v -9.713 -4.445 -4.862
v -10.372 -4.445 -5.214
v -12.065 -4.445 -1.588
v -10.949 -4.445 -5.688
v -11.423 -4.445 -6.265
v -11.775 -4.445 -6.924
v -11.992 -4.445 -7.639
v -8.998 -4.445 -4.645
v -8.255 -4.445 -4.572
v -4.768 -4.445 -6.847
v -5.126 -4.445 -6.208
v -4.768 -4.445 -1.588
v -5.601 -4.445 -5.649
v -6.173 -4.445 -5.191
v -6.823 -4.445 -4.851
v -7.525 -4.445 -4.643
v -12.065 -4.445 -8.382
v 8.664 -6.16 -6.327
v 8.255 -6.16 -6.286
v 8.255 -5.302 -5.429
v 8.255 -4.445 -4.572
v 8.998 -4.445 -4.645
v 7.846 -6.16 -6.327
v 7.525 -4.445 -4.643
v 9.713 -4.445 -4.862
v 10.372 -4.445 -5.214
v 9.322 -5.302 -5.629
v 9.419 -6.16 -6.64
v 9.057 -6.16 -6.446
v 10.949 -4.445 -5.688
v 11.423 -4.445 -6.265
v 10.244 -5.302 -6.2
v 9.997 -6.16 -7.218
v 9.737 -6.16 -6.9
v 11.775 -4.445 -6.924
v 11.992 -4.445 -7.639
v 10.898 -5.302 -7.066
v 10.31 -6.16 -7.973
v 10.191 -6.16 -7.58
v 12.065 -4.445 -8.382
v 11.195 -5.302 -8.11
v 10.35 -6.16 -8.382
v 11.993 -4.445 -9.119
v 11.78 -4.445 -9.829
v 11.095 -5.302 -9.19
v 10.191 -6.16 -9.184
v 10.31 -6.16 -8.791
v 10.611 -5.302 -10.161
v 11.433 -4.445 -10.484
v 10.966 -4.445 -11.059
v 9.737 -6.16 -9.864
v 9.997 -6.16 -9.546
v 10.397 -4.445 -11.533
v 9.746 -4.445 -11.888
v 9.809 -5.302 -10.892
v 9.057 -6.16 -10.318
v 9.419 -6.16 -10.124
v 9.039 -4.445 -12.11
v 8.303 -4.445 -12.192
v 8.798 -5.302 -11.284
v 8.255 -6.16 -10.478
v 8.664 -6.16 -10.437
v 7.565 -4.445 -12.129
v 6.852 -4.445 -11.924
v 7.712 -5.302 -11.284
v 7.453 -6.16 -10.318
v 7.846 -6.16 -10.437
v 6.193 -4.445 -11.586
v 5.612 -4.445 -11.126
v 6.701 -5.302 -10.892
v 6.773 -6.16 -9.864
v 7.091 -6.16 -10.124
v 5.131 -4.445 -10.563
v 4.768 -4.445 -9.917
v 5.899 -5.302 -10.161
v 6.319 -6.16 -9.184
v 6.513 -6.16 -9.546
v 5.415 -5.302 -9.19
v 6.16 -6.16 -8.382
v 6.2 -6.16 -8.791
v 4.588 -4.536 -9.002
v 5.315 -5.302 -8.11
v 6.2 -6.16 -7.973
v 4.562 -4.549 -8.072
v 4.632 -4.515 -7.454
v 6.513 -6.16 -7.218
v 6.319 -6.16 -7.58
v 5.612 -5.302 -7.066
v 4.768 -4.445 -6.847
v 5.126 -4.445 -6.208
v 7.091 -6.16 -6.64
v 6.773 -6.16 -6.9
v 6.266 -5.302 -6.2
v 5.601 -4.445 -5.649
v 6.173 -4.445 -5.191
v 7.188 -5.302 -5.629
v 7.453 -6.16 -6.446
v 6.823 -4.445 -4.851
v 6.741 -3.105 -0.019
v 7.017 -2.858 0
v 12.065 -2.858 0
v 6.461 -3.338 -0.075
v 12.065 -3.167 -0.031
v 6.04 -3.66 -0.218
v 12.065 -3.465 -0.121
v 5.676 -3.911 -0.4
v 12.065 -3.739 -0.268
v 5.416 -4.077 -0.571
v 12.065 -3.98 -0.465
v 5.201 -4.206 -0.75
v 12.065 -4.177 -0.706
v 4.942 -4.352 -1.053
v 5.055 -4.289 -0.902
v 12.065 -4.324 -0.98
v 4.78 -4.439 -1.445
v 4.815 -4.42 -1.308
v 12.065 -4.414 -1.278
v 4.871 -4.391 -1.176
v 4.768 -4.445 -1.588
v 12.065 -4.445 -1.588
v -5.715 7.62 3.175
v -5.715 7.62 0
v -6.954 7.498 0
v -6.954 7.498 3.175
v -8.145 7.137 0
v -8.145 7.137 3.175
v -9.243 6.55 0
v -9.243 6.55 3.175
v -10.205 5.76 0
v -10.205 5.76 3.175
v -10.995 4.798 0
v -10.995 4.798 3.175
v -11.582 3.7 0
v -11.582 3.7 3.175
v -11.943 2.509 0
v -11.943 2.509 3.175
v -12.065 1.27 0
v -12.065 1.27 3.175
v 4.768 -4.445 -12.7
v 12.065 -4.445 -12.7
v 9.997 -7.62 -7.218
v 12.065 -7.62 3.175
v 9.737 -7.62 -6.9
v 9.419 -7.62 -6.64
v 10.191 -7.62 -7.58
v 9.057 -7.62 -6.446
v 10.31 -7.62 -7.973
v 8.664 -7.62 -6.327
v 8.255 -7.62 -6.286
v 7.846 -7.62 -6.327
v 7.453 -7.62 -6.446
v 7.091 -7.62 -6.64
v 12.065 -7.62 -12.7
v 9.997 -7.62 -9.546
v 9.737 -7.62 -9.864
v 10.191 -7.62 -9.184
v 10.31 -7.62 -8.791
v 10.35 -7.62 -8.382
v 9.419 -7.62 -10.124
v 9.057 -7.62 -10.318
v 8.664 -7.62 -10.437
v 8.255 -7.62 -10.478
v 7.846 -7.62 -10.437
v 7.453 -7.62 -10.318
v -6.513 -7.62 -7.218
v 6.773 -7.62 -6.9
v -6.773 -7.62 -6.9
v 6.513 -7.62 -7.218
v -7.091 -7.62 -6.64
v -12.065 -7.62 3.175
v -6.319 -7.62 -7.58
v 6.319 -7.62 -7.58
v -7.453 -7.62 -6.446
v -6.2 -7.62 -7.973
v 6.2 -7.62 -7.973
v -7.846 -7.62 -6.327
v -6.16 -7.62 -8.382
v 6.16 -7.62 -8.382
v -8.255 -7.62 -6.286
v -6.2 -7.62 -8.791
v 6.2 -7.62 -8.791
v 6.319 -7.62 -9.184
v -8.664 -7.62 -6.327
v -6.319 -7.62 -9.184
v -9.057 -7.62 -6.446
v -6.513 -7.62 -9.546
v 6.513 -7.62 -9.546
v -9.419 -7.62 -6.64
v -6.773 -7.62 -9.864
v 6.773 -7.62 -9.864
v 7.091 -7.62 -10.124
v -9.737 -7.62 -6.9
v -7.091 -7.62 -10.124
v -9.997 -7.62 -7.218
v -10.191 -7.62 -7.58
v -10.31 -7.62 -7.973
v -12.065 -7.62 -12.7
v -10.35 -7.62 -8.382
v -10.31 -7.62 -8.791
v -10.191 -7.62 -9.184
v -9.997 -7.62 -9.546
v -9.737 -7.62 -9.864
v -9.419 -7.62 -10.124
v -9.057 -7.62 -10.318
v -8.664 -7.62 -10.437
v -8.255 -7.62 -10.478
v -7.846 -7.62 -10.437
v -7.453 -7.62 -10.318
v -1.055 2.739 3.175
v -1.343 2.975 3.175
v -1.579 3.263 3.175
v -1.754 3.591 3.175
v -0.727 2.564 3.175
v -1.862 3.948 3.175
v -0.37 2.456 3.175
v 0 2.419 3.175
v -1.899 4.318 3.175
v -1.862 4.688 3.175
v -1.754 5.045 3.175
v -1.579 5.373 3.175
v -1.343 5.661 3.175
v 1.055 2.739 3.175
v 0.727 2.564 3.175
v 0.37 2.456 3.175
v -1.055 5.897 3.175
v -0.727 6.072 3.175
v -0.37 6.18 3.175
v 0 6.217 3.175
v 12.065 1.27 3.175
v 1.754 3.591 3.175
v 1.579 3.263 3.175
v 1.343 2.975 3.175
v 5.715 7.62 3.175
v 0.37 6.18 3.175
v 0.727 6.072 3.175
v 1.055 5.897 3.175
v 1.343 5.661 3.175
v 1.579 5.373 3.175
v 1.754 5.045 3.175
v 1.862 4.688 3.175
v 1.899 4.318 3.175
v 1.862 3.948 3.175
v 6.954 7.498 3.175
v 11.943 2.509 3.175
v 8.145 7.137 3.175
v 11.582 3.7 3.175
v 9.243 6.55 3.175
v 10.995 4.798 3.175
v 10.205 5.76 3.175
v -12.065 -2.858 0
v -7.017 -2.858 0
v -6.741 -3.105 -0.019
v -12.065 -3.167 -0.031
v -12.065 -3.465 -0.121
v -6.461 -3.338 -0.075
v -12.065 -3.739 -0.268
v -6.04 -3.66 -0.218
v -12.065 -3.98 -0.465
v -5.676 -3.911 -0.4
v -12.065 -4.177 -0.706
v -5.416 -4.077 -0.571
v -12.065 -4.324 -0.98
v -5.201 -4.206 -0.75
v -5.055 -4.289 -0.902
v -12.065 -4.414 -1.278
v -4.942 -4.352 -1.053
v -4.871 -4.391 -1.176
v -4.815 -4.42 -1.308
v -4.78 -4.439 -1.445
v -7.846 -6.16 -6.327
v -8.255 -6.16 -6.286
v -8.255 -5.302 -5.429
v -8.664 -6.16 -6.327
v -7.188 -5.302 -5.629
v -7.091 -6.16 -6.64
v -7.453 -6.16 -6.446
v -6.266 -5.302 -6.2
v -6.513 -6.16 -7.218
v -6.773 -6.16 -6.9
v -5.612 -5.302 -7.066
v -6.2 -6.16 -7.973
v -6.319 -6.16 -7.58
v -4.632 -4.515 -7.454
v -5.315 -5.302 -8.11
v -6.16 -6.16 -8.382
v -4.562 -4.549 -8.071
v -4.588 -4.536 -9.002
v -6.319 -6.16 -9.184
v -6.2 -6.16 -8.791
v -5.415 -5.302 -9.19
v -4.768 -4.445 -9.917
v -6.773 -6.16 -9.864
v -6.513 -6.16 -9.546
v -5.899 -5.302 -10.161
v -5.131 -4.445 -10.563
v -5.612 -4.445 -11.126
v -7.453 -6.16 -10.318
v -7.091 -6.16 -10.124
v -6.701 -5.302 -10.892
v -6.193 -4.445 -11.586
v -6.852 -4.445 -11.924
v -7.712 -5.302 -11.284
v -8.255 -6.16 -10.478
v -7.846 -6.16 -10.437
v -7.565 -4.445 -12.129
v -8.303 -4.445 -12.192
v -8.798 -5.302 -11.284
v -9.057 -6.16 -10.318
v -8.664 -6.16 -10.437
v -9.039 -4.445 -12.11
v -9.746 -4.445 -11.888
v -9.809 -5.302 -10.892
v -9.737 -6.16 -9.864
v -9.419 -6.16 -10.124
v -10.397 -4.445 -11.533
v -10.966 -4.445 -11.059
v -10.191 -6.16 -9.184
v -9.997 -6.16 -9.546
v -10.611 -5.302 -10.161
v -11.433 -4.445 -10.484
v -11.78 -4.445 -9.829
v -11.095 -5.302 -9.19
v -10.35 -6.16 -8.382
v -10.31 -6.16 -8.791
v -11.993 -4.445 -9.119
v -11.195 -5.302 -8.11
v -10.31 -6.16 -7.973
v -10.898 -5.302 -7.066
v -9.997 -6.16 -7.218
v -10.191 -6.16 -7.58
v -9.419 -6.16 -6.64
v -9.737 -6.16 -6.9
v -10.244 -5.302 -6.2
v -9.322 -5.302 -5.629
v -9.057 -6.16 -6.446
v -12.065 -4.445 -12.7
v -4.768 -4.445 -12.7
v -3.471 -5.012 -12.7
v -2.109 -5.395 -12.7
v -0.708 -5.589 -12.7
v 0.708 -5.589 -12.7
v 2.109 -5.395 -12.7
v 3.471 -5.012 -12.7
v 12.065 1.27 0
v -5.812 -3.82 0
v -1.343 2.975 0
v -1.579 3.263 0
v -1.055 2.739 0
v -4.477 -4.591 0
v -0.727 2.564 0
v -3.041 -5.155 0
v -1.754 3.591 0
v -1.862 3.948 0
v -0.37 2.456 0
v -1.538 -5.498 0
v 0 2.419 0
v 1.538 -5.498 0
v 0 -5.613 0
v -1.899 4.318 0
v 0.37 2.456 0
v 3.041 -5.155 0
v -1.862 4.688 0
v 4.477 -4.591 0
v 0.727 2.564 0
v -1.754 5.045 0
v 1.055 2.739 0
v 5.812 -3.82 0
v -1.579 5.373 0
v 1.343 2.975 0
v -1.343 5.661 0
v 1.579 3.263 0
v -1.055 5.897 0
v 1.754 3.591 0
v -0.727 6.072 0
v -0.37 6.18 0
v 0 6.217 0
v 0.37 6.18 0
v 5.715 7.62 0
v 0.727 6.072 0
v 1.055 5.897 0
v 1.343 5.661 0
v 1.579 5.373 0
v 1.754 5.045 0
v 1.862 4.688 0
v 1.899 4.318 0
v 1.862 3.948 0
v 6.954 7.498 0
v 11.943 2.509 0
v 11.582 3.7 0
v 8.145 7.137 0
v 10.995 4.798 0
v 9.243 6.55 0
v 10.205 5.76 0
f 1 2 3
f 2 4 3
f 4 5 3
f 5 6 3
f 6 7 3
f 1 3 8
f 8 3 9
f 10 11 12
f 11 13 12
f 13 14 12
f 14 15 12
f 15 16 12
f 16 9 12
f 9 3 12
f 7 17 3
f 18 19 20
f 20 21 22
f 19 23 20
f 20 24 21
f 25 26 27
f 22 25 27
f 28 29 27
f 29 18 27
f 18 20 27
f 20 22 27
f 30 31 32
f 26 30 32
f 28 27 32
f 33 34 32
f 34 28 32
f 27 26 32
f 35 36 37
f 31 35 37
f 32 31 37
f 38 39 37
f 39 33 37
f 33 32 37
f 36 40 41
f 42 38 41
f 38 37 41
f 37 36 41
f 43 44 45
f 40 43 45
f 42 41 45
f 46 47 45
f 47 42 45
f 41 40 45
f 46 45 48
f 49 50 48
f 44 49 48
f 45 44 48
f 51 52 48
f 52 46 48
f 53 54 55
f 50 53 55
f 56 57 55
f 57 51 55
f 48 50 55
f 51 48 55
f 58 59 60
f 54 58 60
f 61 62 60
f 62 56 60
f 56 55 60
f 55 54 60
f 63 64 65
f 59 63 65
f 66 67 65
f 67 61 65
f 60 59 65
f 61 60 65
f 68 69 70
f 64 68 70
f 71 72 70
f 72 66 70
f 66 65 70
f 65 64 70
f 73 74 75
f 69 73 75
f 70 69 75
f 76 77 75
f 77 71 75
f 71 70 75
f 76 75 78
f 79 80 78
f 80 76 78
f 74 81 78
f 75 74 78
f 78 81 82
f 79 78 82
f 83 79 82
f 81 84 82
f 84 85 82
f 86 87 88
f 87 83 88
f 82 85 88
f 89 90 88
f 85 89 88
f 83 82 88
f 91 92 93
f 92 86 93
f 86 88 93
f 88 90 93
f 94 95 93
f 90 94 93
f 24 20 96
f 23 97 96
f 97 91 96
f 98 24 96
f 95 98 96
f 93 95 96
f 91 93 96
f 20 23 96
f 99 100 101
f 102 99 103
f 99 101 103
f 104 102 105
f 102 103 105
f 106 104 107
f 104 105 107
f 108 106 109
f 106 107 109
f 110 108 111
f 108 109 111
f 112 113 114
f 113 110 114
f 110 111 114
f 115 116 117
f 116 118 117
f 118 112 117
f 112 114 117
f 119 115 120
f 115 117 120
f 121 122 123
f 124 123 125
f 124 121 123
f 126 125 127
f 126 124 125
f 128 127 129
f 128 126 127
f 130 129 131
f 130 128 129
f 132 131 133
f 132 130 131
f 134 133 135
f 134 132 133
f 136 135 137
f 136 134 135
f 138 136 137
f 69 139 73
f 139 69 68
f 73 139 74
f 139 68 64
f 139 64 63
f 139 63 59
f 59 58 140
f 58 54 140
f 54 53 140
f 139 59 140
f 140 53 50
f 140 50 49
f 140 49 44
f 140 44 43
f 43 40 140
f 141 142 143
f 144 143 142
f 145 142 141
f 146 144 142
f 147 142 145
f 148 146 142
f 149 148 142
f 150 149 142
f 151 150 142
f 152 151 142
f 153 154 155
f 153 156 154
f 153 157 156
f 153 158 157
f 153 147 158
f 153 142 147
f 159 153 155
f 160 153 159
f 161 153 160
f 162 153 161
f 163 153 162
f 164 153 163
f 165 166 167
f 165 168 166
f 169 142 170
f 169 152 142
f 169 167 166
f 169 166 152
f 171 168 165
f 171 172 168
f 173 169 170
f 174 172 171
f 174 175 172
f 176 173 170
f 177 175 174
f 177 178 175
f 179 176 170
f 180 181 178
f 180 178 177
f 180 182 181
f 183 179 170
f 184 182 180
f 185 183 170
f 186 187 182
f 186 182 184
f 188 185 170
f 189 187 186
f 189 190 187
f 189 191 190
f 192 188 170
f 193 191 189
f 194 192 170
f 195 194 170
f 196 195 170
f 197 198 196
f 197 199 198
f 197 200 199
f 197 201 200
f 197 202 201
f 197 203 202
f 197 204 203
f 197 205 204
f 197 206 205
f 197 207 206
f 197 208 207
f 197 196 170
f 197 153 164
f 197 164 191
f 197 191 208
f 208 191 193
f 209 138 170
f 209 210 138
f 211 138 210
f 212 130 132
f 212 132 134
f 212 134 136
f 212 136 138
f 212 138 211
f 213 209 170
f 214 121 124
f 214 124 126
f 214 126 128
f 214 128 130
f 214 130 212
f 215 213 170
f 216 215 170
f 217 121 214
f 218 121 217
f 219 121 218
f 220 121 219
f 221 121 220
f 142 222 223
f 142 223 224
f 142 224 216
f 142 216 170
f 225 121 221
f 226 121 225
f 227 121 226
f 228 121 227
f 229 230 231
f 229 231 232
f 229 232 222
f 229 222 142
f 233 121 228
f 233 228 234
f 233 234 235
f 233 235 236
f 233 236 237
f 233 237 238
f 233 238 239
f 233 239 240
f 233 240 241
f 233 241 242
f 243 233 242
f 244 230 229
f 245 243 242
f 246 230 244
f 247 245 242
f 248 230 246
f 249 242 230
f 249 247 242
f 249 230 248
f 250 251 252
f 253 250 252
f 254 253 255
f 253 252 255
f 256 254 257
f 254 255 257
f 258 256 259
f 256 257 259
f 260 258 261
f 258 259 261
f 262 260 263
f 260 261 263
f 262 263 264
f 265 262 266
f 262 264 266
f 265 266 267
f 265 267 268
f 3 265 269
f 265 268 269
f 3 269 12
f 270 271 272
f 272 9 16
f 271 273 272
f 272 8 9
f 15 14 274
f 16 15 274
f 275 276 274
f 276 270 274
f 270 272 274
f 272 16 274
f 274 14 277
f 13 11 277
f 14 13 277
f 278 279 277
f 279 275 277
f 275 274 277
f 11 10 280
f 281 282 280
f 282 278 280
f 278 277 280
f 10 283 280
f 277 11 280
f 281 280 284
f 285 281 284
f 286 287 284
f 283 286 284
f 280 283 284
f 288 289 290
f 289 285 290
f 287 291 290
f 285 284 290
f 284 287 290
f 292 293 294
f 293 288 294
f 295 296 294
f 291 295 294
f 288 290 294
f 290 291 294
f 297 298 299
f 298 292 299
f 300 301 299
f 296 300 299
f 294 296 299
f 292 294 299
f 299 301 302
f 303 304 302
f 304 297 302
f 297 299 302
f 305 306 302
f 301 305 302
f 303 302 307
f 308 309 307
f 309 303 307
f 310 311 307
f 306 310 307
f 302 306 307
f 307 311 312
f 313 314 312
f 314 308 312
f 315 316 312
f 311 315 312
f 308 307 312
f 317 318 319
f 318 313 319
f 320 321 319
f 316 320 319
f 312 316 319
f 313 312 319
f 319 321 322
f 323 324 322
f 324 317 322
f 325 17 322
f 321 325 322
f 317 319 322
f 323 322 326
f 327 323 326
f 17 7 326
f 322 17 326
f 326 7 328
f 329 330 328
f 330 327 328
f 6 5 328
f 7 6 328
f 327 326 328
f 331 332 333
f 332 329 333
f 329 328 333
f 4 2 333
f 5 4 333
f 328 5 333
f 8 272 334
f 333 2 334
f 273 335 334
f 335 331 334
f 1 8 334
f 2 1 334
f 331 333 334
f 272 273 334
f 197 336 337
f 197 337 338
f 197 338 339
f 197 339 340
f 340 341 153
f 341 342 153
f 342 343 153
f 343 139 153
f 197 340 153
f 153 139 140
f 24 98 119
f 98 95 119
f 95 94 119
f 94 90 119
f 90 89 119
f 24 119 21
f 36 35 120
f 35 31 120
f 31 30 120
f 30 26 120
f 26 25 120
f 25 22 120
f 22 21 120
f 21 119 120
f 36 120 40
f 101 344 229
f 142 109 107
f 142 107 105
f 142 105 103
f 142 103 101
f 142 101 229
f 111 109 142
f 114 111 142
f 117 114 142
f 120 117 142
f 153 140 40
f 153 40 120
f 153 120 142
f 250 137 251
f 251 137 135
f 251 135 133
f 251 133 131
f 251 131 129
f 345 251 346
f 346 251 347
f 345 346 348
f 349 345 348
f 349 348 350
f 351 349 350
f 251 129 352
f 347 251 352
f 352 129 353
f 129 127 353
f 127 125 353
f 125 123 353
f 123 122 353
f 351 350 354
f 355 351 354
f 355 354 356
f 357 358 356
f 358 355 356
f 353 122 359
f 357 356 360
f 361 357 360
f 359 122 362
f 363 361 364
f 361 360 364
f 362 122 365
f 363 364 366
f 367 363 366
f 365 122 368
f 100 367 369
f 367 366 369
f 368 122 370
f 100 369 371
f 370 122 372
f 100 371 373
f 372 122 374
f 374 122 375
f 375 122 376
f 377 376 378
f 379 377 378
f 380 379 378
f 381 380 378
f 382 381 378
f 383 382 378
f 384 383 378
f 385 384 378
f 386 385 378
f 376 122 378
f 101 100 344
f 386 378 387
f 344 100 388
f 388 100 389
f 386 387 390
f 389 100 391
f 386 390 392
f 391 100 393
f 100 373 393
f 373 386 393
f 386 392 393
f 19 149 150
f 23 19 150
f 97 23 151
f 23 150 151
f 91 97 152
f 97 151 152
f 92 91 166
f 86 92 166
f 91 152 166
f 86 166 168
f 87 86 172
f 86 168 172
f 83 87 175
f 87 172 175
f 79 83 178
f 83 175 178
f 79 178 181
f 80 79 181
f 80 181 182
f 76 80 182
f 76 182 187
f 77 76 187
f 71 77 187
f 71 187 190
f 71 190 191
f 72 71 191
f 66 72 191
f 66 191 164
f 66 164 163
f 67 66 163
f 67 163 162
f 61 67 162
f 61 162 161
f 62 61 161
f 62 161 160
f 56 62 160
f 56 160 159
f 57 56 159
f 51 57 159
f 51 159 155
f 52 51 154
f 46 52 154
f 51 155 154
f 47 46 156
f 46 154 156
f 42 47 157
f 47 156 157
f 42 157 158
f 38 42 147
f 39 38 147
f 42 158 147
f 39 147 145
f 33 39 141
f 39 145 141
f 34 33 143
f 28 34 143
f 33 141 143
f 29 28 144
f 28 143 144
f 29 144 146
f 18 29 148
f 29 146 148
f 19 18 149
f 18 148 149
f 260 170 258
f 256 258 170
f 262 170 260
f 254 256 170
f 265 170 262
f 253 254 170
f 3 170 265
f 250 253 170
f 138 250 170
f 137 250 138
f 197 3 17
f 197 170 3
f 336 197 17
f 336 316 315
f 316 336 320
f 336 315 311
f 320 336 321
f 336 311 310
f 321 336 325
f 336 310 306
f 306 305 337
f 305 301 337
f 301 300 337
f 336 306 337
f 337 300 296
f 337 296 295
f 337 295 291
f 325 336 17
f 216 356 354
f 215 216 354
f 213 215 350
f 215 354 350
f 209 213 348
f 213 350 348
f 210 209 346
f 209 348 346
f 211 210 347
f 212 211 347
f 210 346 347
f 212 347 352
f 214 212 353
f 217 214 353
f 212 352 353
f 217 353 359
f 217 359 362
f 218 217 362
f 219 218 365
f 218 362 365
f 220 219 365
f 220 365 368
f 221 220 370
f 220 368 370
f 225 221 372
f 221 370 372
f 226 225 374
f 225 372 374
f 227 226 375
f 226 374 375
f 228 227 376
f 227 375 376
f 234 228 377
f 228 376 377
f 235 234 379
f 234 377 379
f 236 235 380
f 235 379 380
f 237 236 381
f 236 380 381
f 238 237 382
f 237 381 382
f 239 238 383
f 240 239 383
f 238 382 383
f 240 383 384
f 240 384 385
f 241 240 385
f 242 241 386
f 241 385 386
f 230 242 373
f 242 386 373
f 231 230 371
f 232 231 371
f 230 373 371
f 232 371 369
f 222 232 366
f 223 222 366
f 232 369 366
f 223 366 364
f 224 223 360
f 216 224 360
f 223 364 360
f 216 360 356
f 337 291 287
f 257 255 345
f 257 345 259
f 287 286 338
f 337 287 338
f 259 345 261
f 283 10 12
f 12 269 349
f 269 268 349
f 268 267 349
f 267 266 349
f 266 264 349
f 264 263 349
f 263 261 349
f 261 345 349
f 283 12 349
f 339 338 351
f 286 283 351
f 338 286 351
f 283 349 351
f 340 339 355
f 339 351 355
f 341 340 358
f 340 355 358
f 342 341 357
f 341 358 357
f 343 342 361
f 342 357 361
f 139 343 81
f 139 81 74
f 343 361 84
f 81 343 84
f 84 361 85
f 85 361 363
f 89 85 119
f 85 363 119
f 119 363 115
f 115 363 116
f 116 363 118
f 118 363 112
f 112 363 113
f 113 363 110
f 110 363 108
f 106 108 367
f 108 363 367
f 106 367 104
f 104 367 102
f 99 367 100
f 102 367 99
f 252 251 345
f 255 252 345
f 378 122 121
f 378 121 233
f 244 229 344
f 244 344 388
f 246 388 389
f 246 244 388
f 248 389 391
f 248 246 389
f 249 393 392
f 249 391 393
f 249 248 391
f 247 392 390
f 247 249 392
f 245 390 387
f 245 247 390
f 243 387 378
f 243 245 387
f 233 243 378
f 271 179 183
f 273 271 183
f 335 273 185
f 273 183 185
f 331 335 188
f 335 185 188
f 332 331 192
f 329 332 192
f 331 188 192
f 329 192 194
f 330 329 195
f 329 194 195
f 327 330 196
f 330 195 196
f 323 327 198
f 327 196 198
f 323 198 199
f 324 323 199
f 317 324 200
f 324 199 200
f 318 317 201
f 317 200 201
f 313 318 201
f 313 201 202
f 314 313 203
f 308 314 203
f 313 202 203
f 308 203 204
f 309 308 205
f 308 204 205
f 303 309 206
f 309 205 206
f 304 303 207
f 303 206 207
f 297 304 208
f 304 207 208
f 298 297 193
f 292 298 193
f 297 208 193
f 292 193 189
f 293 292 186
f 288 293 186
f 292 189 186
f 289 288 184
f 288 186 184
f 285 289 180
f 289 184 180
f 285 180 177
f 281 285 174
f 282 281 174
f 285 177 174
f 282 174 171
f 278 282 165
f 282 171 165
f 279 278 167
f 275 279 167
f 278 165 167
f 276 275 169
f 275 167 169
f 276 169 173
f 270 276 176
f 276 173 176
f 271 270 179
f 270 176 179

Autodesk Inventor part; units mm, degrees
ref_plane "YZ Plane" through (0, 0, 0) normal (1, 0, 0) x (0, 1, 0)
ref_plane "XZ Plane" through (0, 0, 0) normal (0, 1, 0) x (-1, 0, 0)
ref_plane "XY Plane" through (0, 0, 0) normal (0, 0, 1) x (1, 0, 0)
sketch "Sketch1" plane through (0, 0, 0) normal (0, 0, 1) x (1, 0, 0)
  line L0 (12.065, -7.62) -> (-12.065, -7.62)
  line L1 (-12.065, -7.62) -> (-12.065, 7.62)
  line L2 (-12.065, 7.62) -> (12.065, 7.62)
  line L3 (12.065, 7.62) -> (12.065, -7.62)
  line L4 (12.065, -7.62) -> (-12.065, 7.62) construction
  line L5 (-12.065, -7.62) -> (12.065, 7.62) construction
  point P0 (0, 0)
  dimension "d0" = 24.13
  dimension "d1" = 15.24
extrude "Extrusion1" add sketch "Sketch1" along normal blind 3.175
sketch "Sketch2" plane through (0, 0, 0) normal (0, 0, 1) x (1, 0, 0)
  line L0 (12.065, 7.62) -> (12.065, -7.62) projected
  line L1 (-12.065, -7.62) -> (-12.065, 7.62) projected
  line L2 (12.065, -7.62) -> (-12.065, -7.62) projected
  line L3 (12.065, -7.62) -> (-12.065, -7.62)
  line L4 (-12.065, -7.62) -> (-12.065, -4.445)
  line L5 (-12.065, -4.445) -> (12.065, -4.445)
  line L6 (12.065, -4.445) -> (12.065, -7.62)
  point P0 (0, 0)
  dimension "d4" = 3.175
extrude "Extrusion2" add sketch "Sketch2" against normal blind 12.7
sketch "Sketch3" plane through (-12.065, -4.445, 0) normal (0, 1, 0) x (1, 0, 0)
  line L0 (0, 0) -> (24.13, 0) projected
  line L1 (12.065, 0) -> (12.065, 12.7) construction
  line L2 (24.13, 12.7) -> (0, 12.7) projected
  line L3 (24.13, -3.175) -> (0, -3.175) projected
  point P0 (3.81, 8.382)
  point P1 (20.32, 8.382)
  point P2 (3.81, -6.5118)
  point P3 (20.32, -6.5118)
  dimension "d34" = 16.51
  dimension "d35" = 8.255
  dimension "d37" = 11.557
hole "Hole1" at (-8.255, -4.445, -8.382) at (8.255, -4.445, -8.382) direction (0, -1, 0) diameter 4.191 end through all countersink diameter 7.62 countersink angle 90
sketch "Sketch4" plane through (0, 0, 3.175) normal (0, 0, 1) x (1, 0, 0)
  point P0 (0, 0)
sketch "Sketch5" plane through (0, 0, 3.175) normal (0, 0, 1) x (1, 0, 0)
  line L0 (-12.065, -7.62) -> (12.065, -7.62) projected
  line L1 (12.065, 7.62) -> (-12.065, 7.62) projected
  point P0 (0, 0)
  point P1 (0, 4.318)
  dimension "d18" = 11.938
  dimension "d27" = 3.302
hole "Hole2" at (0, 4.318, 3.175) direction (0, 0, -1) diameter 3.7973 end through all
fillet "Fillet2" radius 1.5875 1 edges at (0, -4.445, 0)
fillet "Fillet1" radius 6.35 2 edges at (12.065, 7.62, 1.5875) (-12.065, 7.62, 1.5875)
sketch "Sketch6" plane through (0, 0, 0) normal (0, 0, -1) x (-1, 0, 0)
  circle A0 centre (0, 4.318) radius 1.8986 projected
  line L0 (12.065, -4.445) -> (-12.065, -4.445) projected
  circle A1 centre (0, 4.699) radius 10.3124
  circle A2 centre (0, 4.318) radius 9.9187 construction
  circle A3 centre (0, 4.318) radius 9.525 construction
  point P0 (0, 0)
  dimension "d38" = 20.6248
  dimension "d39" = 0.381
  dimension "d40" = 19.8374
  dimension "d41" = 19.05
extrude "Extrusion3" cut sketch "Sketch6" along normal up to surface (12.7 mm away)
sketch "Sketch7" plane through (12.065, -4.445, -1.5875) normal (0, 1, 0) x (1, 0, 0)
  circle A0 centre (-20.32, 6.6675) radius 1.2319 projected
  point P0 (-12.065, -1.5875)
equation "\"d35\" = 0.5 * d34"
properties part number "J005359" material "ALUMINUM, 6061-T651"
